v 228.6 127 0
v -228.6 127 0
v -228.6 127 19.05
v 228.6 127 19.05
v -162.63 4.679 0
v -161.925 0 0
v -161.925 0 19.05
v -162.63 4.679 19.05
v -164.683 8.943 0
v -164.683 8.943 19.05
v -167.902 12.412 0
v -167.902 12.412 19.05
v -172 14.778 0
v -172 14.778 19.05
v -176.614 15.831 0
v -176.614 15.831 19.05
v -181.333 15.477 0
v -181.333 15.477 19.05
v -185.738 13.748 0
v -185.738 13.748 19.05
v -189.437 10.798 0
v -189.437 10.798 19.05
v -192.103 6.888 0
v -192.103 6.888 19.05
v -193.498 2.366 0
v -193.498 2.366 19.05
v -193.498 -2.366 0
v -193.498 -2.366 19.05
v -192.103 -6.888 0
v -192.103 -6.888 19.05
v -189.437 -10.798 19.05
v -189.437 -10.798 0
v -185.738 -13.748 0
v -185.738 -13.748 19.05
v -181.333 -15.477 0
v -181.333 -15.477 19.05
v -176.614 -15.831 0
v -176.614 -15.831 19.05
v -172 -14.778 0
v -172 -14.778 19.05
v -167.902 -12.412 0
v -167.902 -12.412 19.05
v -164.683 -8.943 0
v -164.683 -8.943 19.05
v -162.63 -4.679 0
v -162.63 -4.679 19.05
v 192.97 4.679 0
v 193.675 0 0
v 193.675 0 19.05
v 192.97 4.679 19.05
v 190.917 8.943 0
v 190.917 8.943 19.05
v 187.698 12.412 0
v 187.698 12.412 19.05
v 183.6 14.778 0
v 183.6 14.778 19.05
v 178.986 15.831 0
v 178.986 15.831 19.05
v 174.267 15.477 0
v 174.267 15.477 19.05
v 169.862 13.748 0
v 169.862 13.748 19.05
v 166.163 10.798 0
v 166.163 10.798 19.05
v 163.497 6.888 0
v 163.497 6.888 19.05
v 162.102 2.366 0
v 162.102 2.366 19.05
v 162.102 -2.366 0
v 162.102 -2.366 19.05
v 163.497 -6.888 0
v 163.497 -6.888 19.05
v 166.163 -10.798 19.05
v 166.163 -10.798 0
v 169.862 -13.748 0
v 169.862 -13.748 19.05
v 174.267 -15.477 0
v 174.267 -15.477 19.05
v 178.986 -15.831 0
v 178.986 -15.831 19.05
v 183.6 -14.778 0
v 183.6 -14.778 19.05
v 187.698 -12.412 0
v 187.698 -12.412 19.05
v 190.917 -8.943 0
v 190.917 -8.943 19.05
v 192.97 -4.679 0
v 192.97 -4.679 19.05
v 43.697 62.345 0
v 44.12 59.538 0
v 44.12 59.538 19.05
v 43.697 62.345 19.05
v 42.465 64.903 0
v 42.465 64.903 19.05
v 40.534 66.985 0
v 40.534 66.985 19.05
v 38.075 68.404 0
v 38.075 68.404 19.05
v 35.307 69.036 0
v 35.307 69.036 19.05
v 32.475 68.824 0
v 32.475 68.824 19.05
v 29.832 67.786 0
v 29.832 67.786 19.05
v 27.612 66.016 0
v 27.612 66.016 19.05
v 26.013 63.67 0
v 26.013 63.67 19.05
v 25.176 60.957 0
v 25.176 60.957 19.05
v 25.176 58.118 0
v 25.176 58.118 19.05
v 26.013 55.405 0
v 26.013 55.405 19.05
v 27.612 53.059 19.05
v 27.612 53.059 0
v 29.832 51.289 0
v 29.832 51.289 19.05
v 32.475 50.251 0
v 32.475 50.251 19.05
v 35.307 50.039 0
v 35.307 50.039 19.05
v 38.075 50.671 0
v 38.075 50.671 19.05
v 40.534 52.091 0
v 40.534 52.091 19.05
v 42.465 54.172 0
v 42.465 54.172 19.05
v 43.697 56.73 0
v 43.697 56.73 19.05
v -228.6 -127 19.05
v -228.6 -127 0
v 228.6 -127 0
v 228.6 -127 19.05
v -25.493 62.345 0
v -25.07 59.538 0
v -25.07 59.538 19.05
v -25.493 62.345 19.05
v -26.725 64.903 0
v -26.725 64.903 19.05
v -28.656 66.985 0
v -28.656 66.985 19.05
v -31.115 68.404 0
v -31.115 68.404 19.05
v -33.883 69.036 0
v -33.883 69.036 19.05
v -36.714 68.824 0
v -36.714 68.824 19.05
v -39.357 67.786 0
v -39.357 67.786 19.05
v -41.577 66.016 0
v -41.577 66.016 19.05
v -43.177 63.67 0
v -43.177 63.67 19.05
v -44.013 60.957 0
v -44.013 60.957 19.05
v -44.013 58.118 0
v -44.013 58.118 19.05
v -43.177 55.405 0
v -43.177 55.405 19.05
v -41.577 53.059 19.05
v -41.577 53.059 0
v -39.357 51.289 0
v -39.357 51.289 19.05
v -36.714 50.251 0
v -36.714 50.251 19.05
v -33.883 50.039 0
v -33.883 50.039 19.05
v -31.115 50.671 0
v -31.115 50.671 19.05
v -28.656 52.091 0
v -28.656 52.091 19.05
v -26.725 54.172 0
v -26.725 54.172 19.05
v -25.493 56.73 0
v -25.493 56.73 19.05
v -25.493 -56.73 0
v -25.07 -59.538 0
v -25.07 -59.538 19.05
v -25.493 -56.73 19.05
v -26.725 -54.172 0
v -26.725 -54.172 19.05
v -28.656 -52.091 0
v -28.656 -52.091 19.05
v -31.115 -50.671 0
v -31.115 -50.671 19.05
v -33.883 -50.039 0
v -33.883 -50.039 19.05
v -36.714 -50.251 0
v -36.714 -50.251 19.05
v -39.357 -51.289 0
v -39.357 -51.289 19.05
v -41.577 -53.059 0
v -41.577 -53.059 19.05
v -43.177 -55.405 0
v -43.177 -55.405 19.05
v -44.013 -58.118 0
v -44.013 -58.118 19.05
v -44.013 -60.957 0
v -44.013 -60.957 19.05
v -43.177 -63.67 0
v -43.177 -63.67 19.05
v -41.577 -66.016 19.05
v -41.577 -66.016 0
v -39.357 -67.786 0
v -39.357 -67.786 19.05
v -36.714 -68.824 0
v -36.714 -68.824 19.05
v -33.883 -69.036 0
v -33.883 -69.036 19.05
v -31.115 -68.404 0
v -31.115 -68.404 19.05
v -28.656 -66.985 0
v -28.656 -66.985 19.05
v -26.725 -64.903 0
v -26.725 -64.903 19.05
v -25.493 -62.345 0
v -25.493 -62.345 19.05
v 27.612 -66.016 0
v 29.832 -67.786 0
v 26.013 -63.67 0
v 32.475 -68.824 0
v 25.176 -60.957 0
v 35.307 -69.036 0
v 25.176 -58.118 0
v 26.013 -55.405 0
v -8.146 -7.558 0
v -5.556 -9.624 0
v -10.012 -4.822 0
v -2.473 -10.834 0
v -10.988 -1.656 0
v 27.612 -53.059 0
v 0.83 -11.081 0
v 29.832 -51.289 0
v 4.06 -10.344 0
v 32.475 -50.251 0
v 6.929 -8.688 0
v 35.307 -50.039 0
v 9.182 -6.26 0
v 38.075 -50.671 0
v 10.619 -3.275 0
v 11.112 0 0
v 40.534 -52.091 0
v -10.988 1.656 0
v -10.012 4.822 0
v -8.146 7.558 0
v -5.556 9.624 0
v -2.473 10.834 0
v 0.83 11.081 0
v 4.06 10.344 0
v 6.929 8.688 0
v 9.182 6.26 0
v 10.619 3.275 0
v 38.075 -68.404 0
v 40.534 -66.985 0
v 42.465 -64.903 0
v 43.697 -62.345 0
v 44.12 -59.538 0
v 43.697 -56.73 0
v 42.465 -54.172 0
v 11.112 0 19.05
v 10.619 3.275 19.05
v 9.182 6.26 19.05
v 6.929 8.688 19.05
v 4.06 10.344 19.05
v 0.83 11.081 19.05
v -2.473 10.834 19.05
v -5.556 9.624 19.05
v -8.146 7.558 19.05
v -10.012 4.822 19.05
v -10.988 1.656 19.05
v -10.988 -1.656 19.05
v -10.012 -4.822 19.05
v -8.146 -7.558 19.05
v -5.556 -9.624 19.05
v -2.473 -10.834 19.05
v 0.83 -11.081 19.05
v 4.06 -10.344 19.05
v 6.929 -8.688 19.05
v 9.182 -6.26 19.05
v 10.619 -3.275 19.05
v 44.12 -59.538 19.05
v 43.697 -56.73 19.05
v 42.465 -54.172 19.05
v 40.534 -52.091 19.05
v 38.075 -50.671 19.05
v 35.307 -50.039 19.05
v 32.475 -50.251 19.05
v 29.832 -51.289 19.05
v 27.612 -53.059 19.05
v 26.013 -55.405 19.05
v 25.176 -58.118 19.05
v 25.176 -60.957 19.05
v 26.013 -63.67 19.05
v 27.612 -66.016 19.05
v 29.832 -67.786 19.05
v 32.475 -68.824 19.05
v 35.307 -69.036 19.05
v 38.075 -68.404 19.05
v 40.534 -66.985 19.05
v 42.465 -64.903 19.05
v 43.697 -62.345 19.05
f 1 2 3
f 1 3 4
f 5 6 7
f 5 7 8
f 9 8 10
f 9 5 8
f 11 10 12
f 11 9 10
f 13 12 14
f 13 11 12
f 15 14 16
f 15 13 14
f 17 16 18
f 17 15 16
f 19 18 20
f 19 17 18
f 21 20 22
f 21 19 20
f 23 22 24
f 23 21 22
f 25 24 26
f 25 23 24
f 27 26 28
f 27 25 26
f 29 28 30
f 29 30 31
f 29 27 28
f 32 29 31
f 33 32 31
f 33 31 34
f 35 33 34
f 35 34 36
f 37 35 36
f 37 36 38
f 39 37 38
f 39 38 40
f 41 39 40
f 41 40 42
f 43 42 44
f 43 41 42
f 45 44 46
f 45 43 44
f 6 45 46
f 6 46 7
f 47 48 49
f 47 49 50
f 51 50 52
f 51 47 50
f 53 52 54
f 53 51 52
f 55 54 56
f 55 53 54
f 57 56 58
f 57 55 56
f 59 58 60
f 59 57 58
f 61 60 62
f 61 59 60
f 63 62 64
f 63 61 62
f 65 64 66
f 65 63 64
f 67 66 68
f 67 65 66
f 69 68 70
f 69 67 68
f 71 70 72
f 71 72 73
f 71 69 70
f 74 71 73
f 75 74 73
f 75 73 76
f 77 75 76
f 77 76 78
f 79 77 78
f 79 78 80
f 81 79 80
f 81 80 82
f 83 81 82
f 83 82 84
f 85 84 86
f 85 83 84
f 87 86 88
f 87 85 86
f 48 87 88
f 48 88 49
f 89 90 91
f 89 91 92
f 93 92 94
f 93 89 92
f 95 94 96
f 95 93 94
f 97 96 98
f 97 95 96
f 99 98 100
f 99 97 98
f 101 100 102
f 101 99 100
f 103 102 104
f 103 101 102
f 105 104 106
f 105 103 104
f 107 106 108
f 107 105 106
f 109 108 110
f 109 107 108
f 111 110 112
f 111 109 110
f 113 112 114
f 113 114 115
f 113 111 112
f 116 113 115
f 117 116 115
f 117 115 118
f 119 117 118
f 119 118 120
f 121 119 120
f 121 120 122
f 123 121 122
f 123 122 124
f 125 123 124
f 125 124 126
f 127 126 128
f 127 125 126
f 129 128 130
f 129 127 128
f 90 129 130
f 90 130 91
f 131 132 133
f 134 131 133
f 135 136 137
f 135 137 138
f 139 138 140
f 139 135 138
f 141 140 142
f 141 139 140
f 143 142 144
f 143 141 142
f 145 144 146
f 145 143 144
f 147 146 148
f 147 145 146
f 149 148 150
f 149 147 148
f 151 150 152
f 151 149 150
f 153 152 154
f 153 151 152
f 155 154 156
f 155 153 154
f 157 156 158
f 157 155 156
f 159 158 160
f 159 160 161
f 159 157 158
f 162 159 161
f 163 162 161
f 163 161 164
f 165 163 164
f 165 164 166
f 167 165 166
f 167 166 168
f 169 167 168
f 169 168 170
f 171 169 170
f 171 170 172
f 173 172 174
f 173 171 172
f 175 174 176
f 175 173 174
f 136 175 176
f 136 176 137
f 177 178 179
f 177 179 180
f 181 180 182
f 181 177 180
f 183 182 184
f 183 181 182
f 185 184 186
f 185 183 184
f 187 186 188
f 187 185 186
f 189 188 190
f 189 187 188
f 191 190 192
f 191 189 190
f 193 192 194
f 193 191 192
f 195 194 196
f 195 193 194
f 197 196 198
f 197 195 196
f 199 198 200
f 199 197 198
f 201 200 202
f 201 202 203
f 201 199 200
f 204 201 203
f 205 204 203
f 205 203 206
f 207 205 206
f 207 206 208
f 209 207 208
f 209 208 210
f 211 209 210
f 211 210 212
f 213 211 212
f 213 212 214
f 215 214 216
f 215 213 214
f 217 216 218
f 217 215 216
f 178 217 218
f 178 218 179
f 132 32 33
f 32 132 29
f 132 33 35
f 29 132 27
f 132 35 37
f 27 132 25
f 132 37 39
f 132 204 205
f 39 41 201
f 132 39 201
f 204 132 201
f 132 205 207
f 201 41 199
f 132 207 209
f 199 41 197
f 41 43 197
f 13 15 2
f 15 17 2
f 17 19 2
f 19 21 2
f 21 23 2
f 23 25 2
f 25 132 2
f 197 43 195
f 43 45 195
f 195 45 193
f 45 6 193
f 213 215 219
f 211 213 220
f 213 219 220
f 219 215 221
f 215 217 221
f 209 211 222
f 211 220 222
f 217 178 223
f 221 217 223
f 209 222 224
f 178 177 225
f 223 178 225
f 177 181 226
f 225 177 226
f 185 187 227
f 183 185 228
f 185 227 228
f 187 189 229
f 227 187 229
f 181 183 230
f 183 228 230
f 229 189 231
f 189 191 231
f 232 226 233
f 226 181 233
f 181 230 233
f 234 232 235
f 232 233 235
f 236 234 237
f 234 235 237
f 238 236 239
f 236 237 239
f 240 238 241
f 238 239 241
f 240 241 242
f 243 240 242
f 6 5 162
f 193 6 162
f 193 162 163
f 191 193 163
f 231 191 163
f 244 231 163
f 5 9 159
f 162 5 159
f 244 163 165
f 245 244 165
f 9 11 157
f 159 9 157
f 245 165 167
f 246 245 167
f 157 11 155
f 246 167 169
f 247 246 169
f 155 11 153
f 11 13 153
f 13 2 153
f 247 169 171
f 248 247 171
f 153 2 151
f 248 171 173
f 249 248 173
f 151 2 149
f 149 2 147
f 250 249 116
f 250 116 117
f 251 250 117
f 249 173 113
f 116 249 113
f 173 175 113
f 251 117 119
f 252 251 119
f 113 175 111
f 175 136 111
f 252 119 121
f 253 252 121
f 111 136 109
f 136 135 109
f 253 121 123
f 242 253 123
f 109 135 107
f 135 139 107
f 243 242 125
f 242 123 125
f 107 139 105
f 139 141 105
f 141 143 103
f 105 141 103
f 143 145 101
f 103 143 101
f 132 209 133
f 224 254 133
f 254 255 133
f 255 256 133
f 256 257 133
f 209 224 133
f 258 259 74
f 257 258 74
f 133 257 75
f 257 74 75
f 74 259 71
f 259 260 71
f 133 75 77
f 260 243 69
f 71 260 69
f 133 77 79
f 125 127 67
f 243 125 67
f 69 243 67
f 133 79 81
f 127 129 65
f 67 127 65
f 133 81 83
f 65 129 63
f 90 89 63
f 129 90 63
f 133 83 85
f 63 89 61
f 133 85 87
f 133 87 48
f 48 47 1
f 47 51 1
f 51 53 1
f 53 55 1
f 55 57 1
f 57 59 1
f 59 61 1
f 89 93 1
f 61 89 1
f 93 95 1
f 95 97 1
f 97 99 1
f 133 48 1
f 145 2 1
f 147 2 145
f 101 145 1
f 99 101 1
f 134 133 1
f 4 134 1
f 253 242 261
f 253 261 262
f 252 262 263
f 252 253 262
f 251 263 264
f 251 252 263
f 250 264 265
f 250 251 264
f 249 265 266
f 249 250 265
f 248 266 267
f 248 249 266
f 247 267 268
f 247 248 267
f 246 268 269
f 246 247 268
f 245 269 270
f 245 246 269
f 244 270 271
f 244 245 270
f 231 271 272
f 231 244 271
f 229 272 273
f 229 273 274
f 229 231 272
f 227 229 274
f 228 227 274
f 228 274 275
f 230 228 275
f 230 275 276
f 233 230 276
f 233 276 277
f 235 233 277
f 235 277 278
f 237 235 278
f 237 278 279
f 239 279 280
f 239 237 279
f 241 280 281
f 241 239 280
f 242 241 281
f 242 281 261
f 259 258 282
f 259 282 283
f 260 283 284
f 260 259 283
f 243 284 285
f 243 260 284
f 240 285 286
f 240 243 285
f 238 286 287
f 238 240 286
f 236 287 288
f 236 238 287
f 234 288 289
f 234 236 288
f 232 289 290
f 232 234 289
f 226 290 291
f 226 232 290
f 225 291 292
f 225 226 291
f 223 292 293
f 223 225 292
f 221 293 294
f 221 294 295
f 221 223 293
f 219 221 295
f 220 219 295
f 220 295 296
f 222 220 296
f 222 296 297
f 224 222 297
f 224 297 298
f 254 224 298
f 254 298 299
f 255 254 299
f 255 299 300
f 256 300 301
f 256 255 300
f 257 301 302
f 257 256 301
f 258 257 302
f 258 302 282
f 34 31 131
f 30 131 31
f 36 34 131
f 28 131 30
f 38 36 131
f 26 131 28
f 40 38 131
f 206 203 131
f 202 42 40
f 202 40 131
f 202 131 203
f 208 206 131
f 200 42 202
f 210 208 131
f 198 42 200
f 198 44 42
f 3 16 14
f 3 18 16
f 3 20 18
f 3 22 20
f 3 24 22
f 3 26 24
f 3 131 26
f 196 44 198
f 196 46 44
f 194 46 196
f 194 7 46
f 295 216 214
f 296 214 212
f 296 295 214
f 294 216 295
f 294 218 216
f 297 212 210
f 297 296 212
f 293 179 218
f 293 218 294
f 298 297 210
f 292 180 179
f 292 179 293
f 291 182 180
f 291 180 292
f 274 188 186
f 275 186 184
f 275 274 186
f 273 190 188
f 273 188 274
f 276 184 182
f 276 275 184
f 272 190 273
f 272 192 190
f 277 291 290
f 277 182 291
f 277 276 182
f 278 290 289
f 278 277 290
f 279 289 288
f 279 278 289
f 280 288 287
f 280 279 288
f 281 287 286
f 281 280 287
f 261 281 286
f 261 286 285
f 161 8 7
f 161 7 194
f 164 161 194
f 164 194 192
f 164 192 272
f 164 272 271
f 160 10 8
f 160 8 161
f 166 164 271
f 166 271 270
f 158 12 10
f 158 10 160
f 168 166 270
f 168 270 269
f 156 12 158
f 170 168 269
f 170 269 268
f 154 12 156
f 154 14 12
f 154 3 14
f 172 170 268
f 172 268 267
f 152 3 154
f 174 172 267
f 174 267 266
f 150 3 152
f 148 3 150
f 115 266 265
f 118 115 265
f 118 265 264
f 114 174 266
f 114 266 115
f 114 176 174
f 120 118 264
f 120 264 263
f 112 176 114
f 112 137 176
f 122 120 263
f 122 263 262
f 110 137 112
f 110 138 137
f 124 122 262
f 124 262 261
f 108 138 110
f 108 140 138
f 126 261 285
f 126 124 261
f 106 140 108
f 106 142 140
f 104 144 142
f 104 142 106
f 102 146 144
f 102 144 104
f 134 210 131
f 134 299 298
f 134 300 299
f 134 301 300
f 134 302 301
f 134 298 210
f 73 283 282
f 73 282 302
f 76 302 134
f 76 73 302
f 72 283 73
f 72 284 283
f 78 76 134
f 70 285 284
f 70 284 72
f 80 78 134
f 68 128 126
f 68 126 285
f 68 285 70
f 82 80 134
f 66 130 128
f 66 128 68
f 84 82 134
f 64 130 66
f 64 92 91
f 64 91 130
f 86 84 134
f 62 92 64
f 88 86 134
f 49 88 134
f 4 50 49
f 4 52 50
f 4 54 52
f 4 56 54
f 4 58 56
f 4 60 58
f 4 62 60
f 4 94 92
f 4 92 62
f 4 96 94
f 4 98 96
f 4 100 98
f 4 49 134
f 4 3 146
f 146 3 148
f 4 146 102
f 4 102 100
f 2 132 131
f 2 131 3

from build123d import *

# Parameters (mm, degrees)
F0_W     = 457.2
F0_H     = 254
F0_R     = 9.525
F0_R_2   = 15.875
F0_R_3   = 11.1125
F1_DEPTH = 19.05


with BuildPart() as f1:
    # F0 (on Top) → F1 (new body)
    with BuildSketch(Plane.XY):
        Rectangle(F0_W, F0_H)
        with Locations((-34.5948, -59.5376)):
            Circle(F0_R, mode=Mode.SUBTRACT)
        with Locations((34.5948, -59.5376)):
            Circle(F0_R, mode=Mode.SUBTRACT)
        with Locations((-177.8, 0)):
            Circle(F0_R_2, mode=Mode.SUBTRACT)
        with Locations((-34.5948, 59.5376)):
            Circle(F0_R, mode=Mode.SUBTRACT)
        Circle(F0_R_3, mode=Mode.SUBTRACT)
        with Locations((34.5948, 59.5376)):
            Circle(F0_R, mode=Mode.SUBTRACT)
        with Locations((177.8, 0)):
            Circle(F0_R_2, mode=Mode.SUBTRACT)
    extrude(amount=F1_DEPTH)


solid = f1.part
